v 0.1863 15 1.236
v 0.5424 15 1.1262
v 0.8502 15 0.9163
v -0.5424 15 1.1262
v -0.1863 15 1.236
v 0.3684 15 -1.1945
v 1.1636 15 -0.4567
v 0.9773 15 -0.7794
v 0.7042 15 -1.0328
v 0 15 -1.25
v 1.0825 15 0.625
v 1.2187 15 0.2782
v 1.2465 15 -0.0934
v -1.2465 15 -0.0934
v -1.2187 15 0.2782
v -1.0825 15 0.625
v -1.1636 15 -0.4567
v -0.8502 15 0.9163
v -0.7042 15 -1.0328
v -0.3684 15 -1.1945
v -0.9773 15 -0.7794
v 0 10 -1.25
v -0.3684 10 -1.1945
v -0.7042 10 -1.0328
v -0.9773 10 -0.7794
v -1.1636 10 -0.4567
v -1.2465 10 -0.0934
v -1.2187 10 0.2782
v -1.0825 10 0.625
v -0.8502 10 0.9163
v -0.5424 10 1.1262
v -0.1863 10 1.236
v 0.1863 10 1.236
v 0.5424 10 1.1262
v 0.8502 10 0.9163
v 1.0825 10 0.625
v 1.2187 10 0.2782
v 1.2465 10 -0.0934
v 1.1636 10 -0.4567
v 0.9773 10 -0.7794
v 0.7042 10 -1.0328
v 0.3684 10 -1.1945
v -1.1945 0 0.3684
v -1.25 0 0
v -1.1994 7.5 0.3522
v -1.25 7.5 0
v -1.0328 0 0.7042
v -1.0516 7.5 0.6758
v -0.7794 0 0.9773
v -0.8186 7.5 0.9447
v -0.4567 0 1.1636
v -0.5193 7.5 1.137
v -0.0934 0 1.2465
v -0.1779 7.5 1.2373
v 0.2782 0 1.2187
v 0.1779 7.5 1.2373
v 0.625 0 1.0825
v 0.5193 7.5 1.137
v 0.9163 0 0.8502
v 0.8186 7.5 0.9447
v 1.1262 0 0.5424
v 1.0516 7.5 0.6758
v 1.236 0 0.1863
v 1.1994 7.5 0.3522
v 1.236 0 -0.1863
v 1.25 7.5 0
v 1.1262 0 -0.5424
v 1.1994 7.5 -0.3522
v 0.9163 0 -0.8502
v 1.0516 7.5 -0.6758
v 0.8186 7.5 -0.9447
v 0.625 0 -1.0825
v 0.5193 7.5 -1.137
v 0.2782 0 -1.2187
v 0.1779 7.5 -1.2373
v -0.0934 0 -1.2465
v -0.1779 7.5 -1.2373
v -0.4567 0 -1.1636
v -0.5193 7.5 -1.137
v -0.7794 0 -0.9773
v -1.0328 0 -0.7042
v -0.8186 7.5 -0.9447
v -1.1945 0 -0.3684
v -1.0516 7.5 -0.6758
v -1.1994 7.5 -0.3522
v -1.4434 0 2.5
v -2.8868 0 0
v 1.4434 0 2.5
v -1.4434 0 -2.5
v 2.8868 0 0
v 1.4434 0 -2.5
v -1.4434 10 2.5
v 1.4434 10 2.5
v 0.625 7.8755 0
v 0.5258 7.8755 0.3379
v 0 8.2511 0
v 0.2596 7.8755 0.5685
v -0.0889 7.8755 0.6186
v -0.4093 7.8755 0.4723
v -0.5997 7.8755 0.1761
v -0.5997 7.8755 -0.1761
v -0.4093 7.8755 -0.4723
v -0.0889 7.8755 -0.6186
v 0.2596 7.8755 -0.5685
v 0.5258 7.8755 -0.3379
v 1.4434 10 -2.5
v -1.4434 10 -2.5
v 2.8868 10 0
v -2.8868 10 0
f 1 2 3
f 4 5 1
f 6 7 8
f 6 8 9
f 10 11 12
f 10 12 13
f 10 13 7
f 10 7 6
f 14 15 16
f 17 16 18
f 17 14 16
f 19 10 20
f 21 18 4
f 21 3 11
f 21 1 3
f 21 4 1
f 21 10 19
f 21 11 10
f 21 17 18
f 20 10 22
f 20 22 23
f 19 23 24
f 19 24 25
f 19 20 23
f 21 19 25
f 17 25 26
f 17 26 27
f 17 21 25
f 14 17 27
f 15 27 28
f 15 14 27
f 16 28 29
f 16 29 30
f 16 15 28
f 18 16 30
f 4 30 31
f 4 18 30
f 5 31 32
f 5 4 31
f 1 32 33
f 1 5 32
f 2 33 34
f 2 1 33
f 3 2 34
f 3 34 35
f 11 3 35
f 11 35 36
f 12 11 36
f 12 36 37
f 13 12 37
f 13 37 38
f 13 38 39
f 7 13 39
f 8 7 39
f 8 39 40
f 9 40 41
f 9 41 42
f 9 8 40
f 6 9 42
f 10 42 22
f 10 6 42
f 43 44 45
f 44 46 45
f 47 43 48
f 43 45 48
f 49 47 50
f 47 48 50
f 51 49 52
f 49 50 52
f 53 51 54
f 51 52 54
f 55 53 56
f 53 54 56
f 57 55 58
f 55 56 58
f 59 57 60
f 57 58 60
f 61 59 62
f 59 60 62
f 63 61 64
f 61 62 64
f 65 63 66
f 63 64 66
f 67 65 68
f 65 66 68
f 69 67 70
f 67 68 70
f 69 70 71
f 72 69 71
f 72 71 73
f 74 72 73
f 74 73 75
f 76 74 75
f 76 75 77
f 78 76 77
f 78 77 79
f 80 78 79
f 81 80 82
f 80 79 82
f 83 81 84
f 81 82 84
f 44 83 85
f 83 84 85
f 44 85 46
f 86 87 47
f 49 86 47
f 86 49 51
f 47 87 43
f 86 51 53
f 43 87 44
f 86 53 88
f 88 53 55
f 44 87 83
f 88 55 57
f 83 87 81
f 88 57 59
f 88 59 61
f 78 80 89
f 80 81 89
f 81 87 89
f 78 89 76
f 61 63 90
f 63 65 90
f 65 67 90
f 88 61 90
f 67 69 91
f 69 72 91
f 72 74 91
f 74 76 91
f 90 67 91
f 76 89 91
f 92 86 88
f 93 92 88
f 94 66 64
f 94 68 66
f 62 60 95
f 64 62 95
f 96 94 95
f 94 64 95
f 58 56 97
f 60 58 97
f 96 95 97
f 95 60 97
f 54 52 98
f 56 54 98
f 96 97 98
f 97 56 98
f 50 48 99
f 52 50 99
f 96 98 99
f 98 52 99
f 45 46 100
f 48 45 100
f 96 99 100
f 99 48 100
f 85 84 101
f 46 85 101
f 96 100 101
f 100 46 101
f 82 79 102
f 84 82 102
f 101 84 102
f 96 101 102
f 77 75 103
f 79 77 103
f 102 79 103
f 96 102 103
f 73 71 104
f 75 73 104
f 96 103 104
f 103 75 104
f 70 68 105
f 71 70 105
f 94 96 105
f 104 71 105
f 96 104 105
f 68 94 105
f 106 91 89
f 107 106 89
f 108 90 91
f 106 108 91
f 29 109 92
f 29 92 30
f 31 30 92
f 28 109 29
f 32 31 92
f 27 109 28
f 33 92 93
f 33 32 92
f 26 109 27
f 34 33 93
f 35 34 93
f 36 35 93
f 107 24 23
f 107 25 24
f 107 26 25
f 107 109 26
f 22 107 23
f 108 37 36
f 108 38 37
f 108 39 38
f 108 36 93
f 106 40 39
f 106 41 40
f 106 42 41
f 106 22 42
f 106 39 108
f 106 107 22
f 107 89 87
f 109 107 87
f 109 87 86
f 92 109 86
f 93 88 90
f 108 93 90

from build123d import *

# Parameters (mm, degrees)
HEX_2_DEPTH                 = 10
M3X1_0_FEMALE_THREADS_D     = 2.5
M3X1_0_FEMALE_THREADS_DEPTH = 7.5
M3X1_0_FEMALE_THREADS_TIP   = 0.751075774
M3X1_0_START                = 5
SKETCH2_R                   = 1.25
M3X1_0_MALE_THREADS_DEPTH   = 5


with BuildPart() as part:
    # Sketch1 → Hex 2 (new body)
    with BuildSketch(Plane(origin=(0, 0, 0), x_dir=(1, 0, 0), z_dir=(0, 1, 0))):
        Polygon((2.886751346, 0), (1.443375673, 2.5), (-1.443375673, 2.5), (-2.886751346, 0), (-1.443375673, -2.5), (1.443375673, -2.5), align=None)
    extrude(amount=HEX_2_DEPTH)

    # M3x1.0 Female Threads
    with Locations(Plane.XZ):
        with Locations((0, 0)):
            Hole(M3X1_0_FEMALE_THREADS_D / 2, depth=M3X1_0_FEMALE_THREADS_DEPTH)
            with Locations((0, 0, -(M3X1_0_FEMALE_THREADS_DEPTH + M3X1_0_FEMALE_THREADS_TIP / 2))):  # 118° drill point
                Cone(0, M3X1_0_FEMALE_THREADS_D / 2, M3X1_0_FEMALE_THREADS_TIP, mode=Mode.SUBTRACT)

    # Sketch2 → M3x1.0 Male Threads (add)
    with BuildSketch(Plane(origin=(0, 10, 0), x_dir=(-1, 0, 0), z_dir=(0, 1, 0)).offset(M3X1_0_START)):
        with Locations(Location((0, 0, 0), (0, 0, 270))):
            Circle(SKETCH2_R)
    extrude(amount=-M3X1_0_MALE_THREADS_DEPTH)


solid = part.part
